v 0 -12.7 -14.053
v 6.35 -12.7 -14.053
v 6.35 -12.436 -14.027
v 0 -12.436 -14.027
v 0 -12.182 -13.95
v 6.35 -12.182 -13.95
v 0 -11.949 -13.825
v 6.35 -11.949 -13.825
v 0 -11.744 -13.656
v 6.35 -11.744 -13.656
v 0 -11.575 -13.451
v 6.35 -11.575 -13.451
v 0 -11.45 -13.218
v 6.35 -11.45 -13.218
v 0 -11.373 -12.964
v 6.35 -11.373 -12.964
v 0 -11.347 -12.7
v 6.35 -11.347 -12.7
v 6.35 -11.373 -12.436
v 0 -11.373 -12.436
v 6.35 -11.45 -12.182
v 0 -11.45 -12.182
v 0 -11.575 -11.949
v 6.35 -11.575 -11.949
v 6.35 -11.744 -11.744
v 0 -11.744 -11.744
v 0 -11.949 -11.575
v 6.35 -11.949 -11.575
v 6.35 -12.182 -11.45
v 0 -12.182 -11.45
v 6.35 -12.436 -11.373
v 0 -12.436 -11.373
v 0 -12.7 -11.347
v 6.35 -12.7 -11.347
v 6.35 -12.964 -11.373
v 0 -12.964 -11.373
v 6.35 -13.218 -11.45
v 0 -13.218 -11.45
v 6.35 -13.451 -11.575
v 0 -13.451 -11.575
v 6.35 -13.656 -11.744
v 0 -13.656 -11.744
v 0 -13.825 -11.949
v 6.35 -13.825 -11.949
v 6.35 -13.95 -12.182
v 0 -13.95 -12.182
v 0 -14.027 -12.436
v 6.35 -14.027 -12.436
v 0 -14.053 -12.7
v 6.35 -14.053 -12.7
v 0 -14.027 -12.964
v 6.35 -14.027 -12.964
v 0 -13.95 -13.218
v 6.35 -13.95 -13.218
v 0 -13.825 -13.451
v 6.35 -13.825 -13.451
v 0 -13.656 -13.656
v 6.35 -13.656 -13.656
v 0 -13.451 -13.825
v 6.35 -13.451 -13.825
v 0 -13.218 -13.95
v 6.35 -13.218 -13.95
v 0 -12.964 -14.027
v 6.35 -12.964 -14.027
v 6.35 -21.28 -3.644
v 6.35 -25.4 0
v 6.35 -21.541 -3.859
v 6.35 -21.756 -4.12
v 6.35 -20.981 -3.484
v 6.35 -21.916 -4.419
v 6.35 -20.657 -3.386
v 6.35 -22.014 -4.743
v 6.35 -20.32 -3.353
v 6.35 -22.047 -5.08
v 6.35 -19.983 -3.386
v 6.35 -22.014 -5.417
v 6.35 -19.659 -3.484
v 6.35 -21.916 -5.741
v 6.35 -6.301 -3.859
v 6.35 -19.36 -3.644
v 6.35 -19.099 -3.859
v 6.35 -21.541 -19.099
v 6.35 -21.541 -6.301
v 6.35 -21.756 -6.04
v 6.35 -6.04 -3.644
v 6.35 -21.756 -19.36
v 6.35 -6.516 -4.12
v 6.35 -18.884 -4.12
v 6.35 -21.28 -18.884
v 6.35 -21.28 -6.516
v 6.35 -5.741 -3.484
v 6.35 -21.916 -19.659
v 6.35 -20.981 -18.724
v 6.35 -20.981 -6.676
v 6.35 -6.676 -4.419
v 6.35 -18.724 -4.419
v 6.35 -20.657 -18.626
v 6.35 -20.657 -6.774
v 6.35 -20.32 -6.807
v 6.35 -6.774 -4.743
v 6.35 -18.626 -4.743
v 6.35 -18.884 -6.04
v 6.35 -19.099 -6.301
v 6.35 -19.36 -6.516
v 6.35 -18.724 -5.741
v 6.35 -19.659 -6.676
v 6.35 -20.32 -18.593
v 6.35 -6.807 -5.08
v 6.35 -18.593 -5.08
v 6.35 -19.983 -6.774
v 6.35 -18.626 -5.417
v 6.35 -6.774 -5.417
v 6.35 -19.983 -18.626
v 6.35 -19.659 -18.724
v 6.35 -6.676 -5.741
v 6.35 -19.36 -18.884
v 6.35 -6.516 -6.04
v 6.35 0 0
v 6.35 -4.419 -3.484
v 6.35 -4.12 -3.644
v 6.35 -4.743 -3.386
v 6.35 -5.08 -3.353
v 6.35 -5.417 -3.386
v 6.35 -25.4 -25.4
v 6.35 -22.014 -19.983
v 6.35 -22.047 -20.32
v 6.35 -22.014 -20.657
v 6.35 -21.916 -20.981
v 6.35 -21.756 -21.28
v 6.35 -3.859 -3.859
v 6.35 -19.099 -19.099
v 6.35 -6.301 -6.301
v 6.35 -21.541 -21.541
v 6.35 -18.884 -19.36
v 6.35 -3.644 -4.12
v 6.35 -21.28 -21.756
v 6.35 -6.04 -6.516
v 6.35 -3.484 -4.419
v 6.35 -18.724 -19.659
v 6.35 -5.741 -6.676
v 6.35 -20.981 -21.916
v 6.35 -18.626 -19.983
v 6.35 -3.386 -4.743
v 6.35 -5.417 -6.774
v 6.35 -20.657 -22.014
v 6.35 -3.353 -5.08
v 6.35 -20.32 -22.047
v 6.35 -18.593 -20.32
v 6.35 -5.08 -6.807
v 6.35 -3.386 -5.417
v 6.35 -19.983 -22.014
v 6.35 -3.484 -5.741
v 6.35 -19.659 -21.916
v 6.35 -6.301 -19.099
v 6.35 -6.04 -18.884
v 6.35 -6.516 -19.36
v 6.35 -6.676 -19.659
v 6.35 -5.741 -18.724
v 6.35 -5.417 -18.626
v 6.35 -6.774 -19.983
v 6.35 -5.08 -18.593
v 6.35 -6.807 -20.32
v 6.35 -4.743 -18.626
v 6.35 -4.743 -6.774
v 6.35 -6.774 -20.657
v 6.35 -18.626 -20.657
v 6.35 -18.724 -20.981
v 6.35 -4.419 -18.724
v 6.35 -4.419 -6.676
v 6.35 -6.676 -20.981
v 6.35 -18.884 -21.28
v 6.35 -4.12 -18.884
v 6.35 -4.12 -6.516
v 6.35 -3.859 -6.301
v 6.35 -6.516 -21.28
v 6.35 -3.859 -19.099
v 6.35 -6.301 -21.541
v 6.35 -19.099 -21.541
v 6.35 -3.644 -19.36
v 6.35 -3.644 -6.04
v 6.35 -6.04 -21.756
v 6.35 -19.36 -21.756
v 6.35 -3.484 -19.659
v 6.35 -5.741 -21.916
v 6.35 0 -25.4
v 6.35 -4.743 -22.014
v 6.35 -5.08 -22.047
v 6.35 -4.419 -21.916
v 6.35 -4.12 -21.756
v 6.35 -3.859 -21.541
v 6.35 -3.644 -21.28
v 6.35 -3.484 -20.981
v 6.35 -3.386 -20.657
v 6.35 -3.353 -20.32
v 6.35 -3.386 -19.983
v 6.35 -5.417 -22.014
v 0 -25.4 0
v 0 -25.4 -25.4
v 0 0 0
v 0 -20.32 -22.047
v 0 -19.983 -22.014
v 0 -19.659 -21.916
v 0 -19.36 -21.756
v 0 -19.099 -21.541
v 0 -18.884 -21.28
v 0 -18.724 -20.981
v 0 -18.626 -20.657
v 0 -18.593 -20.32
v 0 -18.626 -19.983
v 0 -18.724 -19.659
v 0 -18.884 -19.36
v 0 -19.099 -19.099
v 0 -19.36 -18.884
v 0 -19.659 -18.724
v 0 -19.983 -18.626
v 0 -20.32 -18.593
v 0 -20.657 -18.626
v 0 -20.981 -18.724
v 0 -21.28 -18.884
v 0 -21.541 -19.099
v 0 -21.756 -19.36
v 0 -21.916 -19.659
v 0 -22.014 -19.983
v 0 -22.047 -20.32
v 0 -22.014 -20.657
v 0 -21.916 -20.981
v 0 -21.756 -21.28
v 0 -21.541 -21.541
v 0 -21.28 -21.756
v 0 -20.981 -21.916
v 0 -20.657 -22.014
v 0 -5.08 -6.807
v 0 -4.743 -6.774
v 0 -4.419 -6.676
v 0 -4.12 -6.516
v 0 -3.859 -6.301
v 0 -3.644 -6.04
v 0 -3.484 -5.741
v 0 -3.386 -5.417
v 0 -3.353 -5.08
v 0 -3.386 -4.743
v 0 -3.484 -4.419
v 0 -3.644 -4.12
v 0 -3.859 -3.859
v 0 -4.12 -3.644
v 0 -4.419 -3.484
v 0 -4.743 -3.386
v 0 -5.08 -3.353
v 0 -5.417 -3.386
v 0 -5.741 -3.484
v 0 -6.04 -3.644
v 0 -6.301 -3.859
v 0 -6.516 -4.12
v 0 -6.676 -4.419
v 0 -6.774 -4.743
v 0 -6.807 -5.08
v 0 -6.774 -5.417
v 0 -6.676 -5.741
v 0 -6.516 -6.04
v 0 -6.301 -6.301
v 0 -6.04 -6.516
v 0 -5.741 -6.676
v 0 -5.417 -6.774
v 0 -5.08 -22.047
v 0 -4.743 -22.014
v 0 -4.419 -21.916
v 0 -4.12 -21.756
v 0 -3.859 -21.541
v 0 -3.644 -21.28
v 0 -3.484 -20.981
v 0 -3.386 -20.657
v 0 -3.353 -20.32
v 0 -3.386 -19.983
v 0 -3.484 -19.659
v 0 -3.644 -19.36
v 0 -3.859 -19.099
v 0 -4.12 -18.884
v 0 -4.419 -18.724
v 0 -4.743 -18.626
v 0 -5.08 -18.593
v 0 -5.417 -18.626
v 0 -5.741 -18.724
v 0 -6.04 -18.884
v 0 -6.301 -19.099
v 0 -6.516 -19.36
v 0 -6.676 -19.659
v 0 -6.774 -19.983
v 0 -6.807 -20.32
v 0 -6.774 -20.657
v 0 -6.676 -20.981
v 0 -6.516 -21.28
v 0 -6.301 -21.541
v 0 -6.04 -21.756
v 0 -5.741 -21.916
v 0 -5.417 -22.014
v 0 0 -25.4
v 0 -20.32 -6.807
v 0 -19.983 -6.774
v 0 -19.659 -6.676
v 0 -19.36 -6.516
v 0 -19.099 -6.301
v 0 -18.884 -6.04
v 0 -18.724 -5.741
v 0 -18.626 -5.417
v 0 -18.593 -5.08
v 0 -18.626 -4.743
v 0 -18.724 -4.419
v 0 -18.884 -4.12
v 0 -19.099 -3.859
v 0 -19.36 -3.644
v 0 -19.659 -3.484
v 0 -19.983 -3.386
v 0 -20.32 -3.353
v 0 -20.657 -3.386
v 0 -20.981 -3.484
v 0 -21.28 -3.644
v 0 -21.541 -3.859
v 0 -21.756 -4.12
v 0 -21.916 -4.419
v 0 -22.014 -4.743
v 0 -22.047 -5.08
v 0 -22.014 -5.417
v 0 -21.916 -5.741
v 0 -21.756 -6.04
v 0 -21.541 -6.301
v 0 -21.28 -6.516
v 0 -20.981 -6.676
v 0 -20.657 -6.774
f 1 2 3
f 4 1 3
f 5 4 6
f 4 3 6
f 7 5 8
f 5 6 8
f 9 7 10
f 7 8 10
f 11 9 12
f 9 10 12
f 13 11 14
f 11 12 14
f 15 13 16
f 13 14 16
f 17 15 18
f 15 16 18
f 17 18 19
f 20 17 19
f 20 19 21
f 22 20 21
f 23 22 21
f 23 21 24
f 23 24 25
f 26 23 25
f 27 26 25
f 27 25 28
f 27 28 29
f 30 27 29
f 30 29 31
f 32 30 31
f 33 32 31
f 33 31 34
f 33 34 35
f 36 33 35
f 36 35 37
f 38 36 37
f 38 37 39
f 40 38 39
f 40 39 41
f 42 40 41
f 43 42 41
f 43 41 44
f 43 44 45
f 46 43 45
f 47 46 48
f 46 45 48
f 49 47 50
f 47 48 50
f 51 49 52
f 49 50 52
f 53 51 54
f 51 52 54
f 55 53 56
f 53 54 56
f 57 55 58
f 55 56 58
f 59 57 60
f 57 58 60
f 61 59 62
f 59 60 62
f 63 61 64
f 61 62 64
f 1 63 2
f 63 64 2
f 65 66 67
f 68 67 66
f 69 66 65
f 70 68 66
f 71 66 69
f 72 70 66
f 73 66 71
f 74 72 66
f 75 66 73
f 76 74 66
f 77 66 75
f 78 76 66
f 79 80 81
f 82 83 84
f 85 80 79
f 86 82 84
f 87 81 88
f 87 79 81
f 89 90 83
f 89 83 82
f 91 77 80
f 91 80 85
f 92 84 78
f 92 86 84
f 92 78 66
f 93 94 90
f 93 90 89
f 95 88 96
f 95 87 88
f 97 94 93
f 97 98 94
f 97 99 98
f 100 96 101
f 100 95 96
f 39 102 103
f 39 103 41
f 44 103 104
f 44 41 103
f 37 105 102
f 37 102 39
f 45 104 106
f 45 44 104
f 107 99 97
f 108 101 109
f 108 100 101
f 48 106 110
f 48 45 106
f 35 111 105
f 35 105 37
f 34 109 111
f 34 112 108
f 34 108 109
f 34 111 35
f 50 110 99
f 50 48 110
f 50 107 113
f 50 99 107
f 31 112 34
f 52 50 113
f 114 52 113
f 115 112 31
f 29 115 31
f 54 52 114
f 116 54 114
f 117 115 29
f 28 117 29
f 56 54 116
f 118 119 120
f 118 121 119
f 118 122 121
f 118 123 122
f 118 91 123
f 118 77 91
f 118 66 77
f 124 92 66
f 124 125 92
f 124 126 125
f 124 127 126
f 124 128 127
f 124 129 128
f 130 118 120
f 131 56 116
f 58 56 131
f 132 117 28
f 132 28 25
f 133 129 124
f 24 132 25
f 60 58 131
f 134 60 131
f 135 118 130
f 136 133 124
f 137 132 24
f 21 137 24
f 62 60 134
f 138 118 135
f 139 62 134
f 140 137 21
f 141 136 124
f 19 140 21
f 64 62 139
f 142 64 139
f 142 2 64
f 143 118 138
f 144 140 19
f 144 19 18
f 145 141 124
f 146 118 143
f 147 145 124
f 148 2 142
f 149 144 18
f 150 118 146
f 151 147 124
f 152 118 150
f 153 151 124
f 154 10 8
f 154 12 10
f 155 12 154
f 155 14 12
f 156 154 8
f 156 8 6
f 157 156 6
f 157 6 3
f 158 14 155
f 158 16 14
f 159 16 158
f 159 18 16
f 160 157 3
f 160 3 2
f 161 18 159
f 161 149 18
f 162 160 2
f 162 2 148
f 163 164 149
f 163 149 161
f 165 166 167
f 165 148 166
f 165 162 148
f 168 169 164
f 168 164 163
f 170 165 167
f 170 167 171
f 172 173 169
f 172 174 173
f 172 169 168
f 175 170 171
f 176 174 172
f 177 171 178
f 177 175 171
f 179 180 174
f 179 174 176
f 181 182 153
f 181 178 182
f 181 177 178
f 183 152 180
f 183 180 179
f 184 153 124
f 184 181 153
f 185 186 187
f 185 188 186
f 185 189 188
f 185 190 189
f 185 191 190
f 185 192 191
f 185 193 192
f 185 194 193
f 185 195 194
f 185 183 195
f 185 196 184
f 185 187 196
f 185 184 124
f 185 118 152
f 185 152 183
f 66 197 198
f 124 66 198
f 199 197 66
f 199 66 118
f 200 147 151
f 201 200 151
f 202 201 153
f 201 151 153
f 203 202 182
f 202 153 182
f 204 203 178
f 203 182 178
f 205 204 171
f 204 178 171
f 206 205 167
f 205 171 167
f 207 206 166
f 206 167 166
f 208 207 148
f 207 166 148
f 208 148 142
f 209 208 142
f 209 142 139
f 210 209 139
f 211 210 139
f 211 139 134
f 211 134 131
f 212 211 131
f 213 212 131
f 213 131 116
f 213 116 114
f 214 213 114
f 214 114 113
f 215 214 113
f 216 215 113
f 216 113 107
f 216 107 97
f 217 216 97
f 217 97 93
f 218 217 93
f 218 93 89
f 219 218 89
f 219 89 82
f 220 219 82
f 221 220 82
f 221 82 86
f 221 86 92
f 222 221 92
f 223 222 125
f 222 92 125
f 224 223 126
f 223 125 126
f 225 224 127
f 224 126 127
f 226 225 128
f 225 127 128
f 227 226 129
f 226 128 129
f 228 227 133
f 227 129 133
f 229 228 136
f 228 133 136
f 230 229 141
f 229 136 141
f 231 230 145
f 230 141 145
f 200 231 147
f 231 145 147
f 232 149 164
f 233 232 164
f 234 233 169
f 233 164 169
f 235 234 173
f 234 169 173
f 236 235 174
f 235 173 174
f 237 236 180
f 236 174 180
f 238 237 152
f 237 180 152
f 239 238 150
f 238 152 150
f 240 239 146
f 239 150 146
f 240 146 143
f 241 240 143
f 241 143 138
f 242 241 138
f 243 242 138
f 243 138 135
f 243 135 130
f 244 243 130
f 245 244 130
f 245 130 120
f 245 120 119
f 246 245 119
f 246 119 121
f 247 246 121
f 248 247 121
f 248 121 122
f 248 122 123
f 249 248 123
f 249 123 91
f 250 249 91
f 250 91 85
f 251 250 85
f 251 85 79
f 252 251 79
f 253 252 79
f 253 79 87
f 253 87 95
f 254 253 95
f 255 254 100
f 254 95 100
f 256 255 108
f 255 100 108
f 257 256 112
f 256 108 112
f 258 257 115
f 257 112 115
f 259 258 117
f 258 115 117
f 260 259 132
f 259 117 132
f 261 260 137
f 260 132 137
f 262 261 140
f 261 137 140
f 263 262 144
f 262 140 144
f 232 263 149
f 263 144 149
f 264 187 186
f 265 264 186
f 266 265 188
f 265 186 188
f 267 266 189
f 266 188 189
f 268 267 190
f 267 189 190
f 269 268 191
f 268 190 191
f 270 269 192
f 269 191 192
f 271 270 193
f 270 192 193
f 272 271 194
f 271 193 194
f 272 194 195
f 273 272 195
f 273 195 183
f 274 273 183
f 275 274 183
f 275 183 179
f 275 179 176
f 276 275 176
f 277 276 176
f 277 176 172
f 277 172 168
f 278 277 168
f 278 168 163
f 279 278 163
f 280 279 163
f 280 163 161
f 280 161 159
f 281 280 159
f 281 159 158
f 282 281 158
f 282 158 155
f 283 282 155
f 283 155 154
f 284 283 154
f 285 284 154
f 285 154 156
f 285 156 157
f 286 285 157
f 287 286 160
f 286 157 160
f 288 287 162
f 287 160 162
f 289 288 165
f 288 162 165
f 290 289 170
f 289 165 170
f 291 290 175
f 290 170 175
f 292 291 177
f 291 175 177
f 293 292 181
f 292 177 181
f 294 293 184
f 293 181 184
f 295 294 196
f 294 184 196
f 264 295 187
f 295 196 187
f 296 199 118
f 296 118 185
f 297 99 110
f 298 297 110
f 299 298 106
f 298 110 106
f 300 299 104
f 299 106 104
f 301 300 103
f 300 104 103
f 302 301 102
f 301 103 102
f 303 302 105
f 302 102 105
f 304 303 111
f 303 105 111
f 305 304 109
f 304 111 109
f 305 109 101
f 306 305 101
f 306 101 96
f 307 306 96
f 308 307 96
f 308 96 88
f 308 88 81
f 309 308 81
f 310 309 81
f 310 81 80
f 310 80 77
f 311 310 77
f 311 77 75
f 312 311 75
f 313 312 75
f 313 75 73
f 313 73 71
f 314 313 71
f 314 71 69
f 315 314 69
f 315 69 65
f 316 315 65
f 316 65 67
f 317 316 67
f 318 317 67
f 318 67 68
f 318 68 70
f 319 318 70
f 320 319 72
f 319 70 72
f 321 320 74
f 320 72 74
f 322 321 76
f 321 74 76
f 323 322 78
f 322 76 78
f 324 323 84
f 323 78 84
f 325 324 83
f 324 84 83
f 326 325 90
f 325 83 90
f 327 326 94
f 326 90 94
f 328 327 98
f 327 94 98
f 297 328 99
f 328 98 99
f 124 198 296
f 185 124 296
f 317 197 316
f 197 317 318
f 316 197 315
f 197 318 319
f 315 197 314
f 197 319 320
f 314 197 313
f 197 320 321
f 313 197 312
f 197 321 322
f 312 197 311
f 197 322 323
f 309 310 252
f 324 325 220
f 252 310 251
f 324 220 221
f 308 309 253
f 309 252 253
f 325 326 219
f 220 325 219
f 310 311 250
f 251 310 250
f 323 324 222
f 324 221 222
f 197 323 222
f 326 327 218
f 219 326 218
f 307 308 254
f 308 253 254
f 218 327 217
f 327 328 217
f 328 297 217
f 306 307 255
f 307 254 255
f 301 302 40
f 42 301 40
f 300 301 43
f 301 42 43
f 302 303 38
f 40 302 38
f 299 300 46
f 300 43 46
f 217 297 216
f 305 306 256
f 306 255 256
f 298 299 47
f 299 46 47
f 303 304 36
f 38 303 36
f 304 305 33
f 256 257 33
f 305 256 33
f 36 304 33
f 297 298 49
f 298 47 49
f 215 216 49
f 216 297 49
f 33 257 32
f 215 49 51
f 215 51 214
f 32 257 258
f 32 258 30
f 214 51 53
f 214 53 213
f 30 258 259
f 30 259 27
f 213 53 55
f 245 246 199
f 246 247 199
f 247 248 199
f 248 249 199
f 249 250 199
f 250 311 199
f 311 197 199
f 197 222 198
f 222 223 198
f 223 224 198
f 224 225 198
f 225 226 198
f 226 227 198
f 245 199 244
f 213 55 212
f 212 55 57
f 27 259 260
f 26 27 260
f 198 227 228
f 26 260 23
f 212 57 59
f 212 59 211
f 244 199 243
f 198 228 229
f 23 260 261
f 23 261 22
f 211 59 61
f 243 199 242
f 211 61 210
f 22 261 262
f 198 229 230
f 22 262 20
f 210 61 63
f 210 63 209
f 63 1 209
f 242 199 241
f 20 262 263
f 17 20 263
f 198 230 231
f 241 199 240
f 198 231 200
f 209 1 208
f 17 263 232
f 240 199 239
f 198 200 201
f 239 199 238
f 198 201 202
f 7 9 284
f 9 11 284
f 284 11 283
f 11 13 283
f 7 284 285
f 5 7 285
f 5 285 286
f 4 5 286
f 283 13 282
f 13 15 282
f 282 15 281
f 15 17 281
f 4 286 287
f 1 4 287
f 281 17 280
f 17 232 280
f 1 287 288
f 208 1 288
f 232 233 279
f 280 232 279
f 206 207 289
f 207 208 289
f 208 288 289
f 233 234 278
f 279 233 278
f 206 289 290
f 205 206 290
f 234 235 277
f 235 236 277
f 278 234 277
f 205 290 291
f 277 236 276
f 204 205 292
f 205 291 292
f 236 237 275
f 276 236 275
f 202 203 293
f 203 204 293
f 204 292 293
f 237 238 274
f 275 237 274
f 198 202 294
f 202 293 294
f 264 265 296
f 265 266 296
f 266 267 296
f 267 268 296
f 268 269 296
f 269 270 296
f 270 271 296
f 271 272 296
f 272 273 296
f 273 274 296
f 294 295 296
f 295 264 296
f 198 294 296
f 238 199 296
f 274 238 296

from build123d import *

# Parameters (mm, degrees)
SKETCH1_W             = 25.4
SKETCH1_H             = 25.4
BOSS_EXTRUDE1_DEPTH   = 6.35
F_8_32_TAPPED_HOLE5_D = 3.4544
F_6_32_TAPPED_HOLE1_D = 2.7051


with BuildPart() as part:
    # Sketch1 → Boss-Extrude1 (new body)
    with BuildSketch(Plane(origin=(0, 0, 0), x_dir=(0, 0, -1), z_dir=(1, 0, 0))):
        with Locations((12.7, -12.7)):
            Rectangle(SKETCH1_W, SKETCH1_H)
    extrude(amount=BOSS_EXTRUDE1_DEPTH)

    # #8-32 Tapped Hole5 (through all)
    with Locations(Plane.ZY):
        with Locations((-20.32, -20.32), (-20.32, -5.08), (-5.08, -5.08), (-5.08, -20.32)):
            Hole(F_8_32_TAPPED_HOLE5_D / 2)

    # #6-32 Tapped Hole1 (through all)
    with Locations(Plane.ZY):
        with Locations((-12.7, -12.7)):
            Hole(F_6_32_TAPPED_HOLE1_D / 2)


solid = part.part
